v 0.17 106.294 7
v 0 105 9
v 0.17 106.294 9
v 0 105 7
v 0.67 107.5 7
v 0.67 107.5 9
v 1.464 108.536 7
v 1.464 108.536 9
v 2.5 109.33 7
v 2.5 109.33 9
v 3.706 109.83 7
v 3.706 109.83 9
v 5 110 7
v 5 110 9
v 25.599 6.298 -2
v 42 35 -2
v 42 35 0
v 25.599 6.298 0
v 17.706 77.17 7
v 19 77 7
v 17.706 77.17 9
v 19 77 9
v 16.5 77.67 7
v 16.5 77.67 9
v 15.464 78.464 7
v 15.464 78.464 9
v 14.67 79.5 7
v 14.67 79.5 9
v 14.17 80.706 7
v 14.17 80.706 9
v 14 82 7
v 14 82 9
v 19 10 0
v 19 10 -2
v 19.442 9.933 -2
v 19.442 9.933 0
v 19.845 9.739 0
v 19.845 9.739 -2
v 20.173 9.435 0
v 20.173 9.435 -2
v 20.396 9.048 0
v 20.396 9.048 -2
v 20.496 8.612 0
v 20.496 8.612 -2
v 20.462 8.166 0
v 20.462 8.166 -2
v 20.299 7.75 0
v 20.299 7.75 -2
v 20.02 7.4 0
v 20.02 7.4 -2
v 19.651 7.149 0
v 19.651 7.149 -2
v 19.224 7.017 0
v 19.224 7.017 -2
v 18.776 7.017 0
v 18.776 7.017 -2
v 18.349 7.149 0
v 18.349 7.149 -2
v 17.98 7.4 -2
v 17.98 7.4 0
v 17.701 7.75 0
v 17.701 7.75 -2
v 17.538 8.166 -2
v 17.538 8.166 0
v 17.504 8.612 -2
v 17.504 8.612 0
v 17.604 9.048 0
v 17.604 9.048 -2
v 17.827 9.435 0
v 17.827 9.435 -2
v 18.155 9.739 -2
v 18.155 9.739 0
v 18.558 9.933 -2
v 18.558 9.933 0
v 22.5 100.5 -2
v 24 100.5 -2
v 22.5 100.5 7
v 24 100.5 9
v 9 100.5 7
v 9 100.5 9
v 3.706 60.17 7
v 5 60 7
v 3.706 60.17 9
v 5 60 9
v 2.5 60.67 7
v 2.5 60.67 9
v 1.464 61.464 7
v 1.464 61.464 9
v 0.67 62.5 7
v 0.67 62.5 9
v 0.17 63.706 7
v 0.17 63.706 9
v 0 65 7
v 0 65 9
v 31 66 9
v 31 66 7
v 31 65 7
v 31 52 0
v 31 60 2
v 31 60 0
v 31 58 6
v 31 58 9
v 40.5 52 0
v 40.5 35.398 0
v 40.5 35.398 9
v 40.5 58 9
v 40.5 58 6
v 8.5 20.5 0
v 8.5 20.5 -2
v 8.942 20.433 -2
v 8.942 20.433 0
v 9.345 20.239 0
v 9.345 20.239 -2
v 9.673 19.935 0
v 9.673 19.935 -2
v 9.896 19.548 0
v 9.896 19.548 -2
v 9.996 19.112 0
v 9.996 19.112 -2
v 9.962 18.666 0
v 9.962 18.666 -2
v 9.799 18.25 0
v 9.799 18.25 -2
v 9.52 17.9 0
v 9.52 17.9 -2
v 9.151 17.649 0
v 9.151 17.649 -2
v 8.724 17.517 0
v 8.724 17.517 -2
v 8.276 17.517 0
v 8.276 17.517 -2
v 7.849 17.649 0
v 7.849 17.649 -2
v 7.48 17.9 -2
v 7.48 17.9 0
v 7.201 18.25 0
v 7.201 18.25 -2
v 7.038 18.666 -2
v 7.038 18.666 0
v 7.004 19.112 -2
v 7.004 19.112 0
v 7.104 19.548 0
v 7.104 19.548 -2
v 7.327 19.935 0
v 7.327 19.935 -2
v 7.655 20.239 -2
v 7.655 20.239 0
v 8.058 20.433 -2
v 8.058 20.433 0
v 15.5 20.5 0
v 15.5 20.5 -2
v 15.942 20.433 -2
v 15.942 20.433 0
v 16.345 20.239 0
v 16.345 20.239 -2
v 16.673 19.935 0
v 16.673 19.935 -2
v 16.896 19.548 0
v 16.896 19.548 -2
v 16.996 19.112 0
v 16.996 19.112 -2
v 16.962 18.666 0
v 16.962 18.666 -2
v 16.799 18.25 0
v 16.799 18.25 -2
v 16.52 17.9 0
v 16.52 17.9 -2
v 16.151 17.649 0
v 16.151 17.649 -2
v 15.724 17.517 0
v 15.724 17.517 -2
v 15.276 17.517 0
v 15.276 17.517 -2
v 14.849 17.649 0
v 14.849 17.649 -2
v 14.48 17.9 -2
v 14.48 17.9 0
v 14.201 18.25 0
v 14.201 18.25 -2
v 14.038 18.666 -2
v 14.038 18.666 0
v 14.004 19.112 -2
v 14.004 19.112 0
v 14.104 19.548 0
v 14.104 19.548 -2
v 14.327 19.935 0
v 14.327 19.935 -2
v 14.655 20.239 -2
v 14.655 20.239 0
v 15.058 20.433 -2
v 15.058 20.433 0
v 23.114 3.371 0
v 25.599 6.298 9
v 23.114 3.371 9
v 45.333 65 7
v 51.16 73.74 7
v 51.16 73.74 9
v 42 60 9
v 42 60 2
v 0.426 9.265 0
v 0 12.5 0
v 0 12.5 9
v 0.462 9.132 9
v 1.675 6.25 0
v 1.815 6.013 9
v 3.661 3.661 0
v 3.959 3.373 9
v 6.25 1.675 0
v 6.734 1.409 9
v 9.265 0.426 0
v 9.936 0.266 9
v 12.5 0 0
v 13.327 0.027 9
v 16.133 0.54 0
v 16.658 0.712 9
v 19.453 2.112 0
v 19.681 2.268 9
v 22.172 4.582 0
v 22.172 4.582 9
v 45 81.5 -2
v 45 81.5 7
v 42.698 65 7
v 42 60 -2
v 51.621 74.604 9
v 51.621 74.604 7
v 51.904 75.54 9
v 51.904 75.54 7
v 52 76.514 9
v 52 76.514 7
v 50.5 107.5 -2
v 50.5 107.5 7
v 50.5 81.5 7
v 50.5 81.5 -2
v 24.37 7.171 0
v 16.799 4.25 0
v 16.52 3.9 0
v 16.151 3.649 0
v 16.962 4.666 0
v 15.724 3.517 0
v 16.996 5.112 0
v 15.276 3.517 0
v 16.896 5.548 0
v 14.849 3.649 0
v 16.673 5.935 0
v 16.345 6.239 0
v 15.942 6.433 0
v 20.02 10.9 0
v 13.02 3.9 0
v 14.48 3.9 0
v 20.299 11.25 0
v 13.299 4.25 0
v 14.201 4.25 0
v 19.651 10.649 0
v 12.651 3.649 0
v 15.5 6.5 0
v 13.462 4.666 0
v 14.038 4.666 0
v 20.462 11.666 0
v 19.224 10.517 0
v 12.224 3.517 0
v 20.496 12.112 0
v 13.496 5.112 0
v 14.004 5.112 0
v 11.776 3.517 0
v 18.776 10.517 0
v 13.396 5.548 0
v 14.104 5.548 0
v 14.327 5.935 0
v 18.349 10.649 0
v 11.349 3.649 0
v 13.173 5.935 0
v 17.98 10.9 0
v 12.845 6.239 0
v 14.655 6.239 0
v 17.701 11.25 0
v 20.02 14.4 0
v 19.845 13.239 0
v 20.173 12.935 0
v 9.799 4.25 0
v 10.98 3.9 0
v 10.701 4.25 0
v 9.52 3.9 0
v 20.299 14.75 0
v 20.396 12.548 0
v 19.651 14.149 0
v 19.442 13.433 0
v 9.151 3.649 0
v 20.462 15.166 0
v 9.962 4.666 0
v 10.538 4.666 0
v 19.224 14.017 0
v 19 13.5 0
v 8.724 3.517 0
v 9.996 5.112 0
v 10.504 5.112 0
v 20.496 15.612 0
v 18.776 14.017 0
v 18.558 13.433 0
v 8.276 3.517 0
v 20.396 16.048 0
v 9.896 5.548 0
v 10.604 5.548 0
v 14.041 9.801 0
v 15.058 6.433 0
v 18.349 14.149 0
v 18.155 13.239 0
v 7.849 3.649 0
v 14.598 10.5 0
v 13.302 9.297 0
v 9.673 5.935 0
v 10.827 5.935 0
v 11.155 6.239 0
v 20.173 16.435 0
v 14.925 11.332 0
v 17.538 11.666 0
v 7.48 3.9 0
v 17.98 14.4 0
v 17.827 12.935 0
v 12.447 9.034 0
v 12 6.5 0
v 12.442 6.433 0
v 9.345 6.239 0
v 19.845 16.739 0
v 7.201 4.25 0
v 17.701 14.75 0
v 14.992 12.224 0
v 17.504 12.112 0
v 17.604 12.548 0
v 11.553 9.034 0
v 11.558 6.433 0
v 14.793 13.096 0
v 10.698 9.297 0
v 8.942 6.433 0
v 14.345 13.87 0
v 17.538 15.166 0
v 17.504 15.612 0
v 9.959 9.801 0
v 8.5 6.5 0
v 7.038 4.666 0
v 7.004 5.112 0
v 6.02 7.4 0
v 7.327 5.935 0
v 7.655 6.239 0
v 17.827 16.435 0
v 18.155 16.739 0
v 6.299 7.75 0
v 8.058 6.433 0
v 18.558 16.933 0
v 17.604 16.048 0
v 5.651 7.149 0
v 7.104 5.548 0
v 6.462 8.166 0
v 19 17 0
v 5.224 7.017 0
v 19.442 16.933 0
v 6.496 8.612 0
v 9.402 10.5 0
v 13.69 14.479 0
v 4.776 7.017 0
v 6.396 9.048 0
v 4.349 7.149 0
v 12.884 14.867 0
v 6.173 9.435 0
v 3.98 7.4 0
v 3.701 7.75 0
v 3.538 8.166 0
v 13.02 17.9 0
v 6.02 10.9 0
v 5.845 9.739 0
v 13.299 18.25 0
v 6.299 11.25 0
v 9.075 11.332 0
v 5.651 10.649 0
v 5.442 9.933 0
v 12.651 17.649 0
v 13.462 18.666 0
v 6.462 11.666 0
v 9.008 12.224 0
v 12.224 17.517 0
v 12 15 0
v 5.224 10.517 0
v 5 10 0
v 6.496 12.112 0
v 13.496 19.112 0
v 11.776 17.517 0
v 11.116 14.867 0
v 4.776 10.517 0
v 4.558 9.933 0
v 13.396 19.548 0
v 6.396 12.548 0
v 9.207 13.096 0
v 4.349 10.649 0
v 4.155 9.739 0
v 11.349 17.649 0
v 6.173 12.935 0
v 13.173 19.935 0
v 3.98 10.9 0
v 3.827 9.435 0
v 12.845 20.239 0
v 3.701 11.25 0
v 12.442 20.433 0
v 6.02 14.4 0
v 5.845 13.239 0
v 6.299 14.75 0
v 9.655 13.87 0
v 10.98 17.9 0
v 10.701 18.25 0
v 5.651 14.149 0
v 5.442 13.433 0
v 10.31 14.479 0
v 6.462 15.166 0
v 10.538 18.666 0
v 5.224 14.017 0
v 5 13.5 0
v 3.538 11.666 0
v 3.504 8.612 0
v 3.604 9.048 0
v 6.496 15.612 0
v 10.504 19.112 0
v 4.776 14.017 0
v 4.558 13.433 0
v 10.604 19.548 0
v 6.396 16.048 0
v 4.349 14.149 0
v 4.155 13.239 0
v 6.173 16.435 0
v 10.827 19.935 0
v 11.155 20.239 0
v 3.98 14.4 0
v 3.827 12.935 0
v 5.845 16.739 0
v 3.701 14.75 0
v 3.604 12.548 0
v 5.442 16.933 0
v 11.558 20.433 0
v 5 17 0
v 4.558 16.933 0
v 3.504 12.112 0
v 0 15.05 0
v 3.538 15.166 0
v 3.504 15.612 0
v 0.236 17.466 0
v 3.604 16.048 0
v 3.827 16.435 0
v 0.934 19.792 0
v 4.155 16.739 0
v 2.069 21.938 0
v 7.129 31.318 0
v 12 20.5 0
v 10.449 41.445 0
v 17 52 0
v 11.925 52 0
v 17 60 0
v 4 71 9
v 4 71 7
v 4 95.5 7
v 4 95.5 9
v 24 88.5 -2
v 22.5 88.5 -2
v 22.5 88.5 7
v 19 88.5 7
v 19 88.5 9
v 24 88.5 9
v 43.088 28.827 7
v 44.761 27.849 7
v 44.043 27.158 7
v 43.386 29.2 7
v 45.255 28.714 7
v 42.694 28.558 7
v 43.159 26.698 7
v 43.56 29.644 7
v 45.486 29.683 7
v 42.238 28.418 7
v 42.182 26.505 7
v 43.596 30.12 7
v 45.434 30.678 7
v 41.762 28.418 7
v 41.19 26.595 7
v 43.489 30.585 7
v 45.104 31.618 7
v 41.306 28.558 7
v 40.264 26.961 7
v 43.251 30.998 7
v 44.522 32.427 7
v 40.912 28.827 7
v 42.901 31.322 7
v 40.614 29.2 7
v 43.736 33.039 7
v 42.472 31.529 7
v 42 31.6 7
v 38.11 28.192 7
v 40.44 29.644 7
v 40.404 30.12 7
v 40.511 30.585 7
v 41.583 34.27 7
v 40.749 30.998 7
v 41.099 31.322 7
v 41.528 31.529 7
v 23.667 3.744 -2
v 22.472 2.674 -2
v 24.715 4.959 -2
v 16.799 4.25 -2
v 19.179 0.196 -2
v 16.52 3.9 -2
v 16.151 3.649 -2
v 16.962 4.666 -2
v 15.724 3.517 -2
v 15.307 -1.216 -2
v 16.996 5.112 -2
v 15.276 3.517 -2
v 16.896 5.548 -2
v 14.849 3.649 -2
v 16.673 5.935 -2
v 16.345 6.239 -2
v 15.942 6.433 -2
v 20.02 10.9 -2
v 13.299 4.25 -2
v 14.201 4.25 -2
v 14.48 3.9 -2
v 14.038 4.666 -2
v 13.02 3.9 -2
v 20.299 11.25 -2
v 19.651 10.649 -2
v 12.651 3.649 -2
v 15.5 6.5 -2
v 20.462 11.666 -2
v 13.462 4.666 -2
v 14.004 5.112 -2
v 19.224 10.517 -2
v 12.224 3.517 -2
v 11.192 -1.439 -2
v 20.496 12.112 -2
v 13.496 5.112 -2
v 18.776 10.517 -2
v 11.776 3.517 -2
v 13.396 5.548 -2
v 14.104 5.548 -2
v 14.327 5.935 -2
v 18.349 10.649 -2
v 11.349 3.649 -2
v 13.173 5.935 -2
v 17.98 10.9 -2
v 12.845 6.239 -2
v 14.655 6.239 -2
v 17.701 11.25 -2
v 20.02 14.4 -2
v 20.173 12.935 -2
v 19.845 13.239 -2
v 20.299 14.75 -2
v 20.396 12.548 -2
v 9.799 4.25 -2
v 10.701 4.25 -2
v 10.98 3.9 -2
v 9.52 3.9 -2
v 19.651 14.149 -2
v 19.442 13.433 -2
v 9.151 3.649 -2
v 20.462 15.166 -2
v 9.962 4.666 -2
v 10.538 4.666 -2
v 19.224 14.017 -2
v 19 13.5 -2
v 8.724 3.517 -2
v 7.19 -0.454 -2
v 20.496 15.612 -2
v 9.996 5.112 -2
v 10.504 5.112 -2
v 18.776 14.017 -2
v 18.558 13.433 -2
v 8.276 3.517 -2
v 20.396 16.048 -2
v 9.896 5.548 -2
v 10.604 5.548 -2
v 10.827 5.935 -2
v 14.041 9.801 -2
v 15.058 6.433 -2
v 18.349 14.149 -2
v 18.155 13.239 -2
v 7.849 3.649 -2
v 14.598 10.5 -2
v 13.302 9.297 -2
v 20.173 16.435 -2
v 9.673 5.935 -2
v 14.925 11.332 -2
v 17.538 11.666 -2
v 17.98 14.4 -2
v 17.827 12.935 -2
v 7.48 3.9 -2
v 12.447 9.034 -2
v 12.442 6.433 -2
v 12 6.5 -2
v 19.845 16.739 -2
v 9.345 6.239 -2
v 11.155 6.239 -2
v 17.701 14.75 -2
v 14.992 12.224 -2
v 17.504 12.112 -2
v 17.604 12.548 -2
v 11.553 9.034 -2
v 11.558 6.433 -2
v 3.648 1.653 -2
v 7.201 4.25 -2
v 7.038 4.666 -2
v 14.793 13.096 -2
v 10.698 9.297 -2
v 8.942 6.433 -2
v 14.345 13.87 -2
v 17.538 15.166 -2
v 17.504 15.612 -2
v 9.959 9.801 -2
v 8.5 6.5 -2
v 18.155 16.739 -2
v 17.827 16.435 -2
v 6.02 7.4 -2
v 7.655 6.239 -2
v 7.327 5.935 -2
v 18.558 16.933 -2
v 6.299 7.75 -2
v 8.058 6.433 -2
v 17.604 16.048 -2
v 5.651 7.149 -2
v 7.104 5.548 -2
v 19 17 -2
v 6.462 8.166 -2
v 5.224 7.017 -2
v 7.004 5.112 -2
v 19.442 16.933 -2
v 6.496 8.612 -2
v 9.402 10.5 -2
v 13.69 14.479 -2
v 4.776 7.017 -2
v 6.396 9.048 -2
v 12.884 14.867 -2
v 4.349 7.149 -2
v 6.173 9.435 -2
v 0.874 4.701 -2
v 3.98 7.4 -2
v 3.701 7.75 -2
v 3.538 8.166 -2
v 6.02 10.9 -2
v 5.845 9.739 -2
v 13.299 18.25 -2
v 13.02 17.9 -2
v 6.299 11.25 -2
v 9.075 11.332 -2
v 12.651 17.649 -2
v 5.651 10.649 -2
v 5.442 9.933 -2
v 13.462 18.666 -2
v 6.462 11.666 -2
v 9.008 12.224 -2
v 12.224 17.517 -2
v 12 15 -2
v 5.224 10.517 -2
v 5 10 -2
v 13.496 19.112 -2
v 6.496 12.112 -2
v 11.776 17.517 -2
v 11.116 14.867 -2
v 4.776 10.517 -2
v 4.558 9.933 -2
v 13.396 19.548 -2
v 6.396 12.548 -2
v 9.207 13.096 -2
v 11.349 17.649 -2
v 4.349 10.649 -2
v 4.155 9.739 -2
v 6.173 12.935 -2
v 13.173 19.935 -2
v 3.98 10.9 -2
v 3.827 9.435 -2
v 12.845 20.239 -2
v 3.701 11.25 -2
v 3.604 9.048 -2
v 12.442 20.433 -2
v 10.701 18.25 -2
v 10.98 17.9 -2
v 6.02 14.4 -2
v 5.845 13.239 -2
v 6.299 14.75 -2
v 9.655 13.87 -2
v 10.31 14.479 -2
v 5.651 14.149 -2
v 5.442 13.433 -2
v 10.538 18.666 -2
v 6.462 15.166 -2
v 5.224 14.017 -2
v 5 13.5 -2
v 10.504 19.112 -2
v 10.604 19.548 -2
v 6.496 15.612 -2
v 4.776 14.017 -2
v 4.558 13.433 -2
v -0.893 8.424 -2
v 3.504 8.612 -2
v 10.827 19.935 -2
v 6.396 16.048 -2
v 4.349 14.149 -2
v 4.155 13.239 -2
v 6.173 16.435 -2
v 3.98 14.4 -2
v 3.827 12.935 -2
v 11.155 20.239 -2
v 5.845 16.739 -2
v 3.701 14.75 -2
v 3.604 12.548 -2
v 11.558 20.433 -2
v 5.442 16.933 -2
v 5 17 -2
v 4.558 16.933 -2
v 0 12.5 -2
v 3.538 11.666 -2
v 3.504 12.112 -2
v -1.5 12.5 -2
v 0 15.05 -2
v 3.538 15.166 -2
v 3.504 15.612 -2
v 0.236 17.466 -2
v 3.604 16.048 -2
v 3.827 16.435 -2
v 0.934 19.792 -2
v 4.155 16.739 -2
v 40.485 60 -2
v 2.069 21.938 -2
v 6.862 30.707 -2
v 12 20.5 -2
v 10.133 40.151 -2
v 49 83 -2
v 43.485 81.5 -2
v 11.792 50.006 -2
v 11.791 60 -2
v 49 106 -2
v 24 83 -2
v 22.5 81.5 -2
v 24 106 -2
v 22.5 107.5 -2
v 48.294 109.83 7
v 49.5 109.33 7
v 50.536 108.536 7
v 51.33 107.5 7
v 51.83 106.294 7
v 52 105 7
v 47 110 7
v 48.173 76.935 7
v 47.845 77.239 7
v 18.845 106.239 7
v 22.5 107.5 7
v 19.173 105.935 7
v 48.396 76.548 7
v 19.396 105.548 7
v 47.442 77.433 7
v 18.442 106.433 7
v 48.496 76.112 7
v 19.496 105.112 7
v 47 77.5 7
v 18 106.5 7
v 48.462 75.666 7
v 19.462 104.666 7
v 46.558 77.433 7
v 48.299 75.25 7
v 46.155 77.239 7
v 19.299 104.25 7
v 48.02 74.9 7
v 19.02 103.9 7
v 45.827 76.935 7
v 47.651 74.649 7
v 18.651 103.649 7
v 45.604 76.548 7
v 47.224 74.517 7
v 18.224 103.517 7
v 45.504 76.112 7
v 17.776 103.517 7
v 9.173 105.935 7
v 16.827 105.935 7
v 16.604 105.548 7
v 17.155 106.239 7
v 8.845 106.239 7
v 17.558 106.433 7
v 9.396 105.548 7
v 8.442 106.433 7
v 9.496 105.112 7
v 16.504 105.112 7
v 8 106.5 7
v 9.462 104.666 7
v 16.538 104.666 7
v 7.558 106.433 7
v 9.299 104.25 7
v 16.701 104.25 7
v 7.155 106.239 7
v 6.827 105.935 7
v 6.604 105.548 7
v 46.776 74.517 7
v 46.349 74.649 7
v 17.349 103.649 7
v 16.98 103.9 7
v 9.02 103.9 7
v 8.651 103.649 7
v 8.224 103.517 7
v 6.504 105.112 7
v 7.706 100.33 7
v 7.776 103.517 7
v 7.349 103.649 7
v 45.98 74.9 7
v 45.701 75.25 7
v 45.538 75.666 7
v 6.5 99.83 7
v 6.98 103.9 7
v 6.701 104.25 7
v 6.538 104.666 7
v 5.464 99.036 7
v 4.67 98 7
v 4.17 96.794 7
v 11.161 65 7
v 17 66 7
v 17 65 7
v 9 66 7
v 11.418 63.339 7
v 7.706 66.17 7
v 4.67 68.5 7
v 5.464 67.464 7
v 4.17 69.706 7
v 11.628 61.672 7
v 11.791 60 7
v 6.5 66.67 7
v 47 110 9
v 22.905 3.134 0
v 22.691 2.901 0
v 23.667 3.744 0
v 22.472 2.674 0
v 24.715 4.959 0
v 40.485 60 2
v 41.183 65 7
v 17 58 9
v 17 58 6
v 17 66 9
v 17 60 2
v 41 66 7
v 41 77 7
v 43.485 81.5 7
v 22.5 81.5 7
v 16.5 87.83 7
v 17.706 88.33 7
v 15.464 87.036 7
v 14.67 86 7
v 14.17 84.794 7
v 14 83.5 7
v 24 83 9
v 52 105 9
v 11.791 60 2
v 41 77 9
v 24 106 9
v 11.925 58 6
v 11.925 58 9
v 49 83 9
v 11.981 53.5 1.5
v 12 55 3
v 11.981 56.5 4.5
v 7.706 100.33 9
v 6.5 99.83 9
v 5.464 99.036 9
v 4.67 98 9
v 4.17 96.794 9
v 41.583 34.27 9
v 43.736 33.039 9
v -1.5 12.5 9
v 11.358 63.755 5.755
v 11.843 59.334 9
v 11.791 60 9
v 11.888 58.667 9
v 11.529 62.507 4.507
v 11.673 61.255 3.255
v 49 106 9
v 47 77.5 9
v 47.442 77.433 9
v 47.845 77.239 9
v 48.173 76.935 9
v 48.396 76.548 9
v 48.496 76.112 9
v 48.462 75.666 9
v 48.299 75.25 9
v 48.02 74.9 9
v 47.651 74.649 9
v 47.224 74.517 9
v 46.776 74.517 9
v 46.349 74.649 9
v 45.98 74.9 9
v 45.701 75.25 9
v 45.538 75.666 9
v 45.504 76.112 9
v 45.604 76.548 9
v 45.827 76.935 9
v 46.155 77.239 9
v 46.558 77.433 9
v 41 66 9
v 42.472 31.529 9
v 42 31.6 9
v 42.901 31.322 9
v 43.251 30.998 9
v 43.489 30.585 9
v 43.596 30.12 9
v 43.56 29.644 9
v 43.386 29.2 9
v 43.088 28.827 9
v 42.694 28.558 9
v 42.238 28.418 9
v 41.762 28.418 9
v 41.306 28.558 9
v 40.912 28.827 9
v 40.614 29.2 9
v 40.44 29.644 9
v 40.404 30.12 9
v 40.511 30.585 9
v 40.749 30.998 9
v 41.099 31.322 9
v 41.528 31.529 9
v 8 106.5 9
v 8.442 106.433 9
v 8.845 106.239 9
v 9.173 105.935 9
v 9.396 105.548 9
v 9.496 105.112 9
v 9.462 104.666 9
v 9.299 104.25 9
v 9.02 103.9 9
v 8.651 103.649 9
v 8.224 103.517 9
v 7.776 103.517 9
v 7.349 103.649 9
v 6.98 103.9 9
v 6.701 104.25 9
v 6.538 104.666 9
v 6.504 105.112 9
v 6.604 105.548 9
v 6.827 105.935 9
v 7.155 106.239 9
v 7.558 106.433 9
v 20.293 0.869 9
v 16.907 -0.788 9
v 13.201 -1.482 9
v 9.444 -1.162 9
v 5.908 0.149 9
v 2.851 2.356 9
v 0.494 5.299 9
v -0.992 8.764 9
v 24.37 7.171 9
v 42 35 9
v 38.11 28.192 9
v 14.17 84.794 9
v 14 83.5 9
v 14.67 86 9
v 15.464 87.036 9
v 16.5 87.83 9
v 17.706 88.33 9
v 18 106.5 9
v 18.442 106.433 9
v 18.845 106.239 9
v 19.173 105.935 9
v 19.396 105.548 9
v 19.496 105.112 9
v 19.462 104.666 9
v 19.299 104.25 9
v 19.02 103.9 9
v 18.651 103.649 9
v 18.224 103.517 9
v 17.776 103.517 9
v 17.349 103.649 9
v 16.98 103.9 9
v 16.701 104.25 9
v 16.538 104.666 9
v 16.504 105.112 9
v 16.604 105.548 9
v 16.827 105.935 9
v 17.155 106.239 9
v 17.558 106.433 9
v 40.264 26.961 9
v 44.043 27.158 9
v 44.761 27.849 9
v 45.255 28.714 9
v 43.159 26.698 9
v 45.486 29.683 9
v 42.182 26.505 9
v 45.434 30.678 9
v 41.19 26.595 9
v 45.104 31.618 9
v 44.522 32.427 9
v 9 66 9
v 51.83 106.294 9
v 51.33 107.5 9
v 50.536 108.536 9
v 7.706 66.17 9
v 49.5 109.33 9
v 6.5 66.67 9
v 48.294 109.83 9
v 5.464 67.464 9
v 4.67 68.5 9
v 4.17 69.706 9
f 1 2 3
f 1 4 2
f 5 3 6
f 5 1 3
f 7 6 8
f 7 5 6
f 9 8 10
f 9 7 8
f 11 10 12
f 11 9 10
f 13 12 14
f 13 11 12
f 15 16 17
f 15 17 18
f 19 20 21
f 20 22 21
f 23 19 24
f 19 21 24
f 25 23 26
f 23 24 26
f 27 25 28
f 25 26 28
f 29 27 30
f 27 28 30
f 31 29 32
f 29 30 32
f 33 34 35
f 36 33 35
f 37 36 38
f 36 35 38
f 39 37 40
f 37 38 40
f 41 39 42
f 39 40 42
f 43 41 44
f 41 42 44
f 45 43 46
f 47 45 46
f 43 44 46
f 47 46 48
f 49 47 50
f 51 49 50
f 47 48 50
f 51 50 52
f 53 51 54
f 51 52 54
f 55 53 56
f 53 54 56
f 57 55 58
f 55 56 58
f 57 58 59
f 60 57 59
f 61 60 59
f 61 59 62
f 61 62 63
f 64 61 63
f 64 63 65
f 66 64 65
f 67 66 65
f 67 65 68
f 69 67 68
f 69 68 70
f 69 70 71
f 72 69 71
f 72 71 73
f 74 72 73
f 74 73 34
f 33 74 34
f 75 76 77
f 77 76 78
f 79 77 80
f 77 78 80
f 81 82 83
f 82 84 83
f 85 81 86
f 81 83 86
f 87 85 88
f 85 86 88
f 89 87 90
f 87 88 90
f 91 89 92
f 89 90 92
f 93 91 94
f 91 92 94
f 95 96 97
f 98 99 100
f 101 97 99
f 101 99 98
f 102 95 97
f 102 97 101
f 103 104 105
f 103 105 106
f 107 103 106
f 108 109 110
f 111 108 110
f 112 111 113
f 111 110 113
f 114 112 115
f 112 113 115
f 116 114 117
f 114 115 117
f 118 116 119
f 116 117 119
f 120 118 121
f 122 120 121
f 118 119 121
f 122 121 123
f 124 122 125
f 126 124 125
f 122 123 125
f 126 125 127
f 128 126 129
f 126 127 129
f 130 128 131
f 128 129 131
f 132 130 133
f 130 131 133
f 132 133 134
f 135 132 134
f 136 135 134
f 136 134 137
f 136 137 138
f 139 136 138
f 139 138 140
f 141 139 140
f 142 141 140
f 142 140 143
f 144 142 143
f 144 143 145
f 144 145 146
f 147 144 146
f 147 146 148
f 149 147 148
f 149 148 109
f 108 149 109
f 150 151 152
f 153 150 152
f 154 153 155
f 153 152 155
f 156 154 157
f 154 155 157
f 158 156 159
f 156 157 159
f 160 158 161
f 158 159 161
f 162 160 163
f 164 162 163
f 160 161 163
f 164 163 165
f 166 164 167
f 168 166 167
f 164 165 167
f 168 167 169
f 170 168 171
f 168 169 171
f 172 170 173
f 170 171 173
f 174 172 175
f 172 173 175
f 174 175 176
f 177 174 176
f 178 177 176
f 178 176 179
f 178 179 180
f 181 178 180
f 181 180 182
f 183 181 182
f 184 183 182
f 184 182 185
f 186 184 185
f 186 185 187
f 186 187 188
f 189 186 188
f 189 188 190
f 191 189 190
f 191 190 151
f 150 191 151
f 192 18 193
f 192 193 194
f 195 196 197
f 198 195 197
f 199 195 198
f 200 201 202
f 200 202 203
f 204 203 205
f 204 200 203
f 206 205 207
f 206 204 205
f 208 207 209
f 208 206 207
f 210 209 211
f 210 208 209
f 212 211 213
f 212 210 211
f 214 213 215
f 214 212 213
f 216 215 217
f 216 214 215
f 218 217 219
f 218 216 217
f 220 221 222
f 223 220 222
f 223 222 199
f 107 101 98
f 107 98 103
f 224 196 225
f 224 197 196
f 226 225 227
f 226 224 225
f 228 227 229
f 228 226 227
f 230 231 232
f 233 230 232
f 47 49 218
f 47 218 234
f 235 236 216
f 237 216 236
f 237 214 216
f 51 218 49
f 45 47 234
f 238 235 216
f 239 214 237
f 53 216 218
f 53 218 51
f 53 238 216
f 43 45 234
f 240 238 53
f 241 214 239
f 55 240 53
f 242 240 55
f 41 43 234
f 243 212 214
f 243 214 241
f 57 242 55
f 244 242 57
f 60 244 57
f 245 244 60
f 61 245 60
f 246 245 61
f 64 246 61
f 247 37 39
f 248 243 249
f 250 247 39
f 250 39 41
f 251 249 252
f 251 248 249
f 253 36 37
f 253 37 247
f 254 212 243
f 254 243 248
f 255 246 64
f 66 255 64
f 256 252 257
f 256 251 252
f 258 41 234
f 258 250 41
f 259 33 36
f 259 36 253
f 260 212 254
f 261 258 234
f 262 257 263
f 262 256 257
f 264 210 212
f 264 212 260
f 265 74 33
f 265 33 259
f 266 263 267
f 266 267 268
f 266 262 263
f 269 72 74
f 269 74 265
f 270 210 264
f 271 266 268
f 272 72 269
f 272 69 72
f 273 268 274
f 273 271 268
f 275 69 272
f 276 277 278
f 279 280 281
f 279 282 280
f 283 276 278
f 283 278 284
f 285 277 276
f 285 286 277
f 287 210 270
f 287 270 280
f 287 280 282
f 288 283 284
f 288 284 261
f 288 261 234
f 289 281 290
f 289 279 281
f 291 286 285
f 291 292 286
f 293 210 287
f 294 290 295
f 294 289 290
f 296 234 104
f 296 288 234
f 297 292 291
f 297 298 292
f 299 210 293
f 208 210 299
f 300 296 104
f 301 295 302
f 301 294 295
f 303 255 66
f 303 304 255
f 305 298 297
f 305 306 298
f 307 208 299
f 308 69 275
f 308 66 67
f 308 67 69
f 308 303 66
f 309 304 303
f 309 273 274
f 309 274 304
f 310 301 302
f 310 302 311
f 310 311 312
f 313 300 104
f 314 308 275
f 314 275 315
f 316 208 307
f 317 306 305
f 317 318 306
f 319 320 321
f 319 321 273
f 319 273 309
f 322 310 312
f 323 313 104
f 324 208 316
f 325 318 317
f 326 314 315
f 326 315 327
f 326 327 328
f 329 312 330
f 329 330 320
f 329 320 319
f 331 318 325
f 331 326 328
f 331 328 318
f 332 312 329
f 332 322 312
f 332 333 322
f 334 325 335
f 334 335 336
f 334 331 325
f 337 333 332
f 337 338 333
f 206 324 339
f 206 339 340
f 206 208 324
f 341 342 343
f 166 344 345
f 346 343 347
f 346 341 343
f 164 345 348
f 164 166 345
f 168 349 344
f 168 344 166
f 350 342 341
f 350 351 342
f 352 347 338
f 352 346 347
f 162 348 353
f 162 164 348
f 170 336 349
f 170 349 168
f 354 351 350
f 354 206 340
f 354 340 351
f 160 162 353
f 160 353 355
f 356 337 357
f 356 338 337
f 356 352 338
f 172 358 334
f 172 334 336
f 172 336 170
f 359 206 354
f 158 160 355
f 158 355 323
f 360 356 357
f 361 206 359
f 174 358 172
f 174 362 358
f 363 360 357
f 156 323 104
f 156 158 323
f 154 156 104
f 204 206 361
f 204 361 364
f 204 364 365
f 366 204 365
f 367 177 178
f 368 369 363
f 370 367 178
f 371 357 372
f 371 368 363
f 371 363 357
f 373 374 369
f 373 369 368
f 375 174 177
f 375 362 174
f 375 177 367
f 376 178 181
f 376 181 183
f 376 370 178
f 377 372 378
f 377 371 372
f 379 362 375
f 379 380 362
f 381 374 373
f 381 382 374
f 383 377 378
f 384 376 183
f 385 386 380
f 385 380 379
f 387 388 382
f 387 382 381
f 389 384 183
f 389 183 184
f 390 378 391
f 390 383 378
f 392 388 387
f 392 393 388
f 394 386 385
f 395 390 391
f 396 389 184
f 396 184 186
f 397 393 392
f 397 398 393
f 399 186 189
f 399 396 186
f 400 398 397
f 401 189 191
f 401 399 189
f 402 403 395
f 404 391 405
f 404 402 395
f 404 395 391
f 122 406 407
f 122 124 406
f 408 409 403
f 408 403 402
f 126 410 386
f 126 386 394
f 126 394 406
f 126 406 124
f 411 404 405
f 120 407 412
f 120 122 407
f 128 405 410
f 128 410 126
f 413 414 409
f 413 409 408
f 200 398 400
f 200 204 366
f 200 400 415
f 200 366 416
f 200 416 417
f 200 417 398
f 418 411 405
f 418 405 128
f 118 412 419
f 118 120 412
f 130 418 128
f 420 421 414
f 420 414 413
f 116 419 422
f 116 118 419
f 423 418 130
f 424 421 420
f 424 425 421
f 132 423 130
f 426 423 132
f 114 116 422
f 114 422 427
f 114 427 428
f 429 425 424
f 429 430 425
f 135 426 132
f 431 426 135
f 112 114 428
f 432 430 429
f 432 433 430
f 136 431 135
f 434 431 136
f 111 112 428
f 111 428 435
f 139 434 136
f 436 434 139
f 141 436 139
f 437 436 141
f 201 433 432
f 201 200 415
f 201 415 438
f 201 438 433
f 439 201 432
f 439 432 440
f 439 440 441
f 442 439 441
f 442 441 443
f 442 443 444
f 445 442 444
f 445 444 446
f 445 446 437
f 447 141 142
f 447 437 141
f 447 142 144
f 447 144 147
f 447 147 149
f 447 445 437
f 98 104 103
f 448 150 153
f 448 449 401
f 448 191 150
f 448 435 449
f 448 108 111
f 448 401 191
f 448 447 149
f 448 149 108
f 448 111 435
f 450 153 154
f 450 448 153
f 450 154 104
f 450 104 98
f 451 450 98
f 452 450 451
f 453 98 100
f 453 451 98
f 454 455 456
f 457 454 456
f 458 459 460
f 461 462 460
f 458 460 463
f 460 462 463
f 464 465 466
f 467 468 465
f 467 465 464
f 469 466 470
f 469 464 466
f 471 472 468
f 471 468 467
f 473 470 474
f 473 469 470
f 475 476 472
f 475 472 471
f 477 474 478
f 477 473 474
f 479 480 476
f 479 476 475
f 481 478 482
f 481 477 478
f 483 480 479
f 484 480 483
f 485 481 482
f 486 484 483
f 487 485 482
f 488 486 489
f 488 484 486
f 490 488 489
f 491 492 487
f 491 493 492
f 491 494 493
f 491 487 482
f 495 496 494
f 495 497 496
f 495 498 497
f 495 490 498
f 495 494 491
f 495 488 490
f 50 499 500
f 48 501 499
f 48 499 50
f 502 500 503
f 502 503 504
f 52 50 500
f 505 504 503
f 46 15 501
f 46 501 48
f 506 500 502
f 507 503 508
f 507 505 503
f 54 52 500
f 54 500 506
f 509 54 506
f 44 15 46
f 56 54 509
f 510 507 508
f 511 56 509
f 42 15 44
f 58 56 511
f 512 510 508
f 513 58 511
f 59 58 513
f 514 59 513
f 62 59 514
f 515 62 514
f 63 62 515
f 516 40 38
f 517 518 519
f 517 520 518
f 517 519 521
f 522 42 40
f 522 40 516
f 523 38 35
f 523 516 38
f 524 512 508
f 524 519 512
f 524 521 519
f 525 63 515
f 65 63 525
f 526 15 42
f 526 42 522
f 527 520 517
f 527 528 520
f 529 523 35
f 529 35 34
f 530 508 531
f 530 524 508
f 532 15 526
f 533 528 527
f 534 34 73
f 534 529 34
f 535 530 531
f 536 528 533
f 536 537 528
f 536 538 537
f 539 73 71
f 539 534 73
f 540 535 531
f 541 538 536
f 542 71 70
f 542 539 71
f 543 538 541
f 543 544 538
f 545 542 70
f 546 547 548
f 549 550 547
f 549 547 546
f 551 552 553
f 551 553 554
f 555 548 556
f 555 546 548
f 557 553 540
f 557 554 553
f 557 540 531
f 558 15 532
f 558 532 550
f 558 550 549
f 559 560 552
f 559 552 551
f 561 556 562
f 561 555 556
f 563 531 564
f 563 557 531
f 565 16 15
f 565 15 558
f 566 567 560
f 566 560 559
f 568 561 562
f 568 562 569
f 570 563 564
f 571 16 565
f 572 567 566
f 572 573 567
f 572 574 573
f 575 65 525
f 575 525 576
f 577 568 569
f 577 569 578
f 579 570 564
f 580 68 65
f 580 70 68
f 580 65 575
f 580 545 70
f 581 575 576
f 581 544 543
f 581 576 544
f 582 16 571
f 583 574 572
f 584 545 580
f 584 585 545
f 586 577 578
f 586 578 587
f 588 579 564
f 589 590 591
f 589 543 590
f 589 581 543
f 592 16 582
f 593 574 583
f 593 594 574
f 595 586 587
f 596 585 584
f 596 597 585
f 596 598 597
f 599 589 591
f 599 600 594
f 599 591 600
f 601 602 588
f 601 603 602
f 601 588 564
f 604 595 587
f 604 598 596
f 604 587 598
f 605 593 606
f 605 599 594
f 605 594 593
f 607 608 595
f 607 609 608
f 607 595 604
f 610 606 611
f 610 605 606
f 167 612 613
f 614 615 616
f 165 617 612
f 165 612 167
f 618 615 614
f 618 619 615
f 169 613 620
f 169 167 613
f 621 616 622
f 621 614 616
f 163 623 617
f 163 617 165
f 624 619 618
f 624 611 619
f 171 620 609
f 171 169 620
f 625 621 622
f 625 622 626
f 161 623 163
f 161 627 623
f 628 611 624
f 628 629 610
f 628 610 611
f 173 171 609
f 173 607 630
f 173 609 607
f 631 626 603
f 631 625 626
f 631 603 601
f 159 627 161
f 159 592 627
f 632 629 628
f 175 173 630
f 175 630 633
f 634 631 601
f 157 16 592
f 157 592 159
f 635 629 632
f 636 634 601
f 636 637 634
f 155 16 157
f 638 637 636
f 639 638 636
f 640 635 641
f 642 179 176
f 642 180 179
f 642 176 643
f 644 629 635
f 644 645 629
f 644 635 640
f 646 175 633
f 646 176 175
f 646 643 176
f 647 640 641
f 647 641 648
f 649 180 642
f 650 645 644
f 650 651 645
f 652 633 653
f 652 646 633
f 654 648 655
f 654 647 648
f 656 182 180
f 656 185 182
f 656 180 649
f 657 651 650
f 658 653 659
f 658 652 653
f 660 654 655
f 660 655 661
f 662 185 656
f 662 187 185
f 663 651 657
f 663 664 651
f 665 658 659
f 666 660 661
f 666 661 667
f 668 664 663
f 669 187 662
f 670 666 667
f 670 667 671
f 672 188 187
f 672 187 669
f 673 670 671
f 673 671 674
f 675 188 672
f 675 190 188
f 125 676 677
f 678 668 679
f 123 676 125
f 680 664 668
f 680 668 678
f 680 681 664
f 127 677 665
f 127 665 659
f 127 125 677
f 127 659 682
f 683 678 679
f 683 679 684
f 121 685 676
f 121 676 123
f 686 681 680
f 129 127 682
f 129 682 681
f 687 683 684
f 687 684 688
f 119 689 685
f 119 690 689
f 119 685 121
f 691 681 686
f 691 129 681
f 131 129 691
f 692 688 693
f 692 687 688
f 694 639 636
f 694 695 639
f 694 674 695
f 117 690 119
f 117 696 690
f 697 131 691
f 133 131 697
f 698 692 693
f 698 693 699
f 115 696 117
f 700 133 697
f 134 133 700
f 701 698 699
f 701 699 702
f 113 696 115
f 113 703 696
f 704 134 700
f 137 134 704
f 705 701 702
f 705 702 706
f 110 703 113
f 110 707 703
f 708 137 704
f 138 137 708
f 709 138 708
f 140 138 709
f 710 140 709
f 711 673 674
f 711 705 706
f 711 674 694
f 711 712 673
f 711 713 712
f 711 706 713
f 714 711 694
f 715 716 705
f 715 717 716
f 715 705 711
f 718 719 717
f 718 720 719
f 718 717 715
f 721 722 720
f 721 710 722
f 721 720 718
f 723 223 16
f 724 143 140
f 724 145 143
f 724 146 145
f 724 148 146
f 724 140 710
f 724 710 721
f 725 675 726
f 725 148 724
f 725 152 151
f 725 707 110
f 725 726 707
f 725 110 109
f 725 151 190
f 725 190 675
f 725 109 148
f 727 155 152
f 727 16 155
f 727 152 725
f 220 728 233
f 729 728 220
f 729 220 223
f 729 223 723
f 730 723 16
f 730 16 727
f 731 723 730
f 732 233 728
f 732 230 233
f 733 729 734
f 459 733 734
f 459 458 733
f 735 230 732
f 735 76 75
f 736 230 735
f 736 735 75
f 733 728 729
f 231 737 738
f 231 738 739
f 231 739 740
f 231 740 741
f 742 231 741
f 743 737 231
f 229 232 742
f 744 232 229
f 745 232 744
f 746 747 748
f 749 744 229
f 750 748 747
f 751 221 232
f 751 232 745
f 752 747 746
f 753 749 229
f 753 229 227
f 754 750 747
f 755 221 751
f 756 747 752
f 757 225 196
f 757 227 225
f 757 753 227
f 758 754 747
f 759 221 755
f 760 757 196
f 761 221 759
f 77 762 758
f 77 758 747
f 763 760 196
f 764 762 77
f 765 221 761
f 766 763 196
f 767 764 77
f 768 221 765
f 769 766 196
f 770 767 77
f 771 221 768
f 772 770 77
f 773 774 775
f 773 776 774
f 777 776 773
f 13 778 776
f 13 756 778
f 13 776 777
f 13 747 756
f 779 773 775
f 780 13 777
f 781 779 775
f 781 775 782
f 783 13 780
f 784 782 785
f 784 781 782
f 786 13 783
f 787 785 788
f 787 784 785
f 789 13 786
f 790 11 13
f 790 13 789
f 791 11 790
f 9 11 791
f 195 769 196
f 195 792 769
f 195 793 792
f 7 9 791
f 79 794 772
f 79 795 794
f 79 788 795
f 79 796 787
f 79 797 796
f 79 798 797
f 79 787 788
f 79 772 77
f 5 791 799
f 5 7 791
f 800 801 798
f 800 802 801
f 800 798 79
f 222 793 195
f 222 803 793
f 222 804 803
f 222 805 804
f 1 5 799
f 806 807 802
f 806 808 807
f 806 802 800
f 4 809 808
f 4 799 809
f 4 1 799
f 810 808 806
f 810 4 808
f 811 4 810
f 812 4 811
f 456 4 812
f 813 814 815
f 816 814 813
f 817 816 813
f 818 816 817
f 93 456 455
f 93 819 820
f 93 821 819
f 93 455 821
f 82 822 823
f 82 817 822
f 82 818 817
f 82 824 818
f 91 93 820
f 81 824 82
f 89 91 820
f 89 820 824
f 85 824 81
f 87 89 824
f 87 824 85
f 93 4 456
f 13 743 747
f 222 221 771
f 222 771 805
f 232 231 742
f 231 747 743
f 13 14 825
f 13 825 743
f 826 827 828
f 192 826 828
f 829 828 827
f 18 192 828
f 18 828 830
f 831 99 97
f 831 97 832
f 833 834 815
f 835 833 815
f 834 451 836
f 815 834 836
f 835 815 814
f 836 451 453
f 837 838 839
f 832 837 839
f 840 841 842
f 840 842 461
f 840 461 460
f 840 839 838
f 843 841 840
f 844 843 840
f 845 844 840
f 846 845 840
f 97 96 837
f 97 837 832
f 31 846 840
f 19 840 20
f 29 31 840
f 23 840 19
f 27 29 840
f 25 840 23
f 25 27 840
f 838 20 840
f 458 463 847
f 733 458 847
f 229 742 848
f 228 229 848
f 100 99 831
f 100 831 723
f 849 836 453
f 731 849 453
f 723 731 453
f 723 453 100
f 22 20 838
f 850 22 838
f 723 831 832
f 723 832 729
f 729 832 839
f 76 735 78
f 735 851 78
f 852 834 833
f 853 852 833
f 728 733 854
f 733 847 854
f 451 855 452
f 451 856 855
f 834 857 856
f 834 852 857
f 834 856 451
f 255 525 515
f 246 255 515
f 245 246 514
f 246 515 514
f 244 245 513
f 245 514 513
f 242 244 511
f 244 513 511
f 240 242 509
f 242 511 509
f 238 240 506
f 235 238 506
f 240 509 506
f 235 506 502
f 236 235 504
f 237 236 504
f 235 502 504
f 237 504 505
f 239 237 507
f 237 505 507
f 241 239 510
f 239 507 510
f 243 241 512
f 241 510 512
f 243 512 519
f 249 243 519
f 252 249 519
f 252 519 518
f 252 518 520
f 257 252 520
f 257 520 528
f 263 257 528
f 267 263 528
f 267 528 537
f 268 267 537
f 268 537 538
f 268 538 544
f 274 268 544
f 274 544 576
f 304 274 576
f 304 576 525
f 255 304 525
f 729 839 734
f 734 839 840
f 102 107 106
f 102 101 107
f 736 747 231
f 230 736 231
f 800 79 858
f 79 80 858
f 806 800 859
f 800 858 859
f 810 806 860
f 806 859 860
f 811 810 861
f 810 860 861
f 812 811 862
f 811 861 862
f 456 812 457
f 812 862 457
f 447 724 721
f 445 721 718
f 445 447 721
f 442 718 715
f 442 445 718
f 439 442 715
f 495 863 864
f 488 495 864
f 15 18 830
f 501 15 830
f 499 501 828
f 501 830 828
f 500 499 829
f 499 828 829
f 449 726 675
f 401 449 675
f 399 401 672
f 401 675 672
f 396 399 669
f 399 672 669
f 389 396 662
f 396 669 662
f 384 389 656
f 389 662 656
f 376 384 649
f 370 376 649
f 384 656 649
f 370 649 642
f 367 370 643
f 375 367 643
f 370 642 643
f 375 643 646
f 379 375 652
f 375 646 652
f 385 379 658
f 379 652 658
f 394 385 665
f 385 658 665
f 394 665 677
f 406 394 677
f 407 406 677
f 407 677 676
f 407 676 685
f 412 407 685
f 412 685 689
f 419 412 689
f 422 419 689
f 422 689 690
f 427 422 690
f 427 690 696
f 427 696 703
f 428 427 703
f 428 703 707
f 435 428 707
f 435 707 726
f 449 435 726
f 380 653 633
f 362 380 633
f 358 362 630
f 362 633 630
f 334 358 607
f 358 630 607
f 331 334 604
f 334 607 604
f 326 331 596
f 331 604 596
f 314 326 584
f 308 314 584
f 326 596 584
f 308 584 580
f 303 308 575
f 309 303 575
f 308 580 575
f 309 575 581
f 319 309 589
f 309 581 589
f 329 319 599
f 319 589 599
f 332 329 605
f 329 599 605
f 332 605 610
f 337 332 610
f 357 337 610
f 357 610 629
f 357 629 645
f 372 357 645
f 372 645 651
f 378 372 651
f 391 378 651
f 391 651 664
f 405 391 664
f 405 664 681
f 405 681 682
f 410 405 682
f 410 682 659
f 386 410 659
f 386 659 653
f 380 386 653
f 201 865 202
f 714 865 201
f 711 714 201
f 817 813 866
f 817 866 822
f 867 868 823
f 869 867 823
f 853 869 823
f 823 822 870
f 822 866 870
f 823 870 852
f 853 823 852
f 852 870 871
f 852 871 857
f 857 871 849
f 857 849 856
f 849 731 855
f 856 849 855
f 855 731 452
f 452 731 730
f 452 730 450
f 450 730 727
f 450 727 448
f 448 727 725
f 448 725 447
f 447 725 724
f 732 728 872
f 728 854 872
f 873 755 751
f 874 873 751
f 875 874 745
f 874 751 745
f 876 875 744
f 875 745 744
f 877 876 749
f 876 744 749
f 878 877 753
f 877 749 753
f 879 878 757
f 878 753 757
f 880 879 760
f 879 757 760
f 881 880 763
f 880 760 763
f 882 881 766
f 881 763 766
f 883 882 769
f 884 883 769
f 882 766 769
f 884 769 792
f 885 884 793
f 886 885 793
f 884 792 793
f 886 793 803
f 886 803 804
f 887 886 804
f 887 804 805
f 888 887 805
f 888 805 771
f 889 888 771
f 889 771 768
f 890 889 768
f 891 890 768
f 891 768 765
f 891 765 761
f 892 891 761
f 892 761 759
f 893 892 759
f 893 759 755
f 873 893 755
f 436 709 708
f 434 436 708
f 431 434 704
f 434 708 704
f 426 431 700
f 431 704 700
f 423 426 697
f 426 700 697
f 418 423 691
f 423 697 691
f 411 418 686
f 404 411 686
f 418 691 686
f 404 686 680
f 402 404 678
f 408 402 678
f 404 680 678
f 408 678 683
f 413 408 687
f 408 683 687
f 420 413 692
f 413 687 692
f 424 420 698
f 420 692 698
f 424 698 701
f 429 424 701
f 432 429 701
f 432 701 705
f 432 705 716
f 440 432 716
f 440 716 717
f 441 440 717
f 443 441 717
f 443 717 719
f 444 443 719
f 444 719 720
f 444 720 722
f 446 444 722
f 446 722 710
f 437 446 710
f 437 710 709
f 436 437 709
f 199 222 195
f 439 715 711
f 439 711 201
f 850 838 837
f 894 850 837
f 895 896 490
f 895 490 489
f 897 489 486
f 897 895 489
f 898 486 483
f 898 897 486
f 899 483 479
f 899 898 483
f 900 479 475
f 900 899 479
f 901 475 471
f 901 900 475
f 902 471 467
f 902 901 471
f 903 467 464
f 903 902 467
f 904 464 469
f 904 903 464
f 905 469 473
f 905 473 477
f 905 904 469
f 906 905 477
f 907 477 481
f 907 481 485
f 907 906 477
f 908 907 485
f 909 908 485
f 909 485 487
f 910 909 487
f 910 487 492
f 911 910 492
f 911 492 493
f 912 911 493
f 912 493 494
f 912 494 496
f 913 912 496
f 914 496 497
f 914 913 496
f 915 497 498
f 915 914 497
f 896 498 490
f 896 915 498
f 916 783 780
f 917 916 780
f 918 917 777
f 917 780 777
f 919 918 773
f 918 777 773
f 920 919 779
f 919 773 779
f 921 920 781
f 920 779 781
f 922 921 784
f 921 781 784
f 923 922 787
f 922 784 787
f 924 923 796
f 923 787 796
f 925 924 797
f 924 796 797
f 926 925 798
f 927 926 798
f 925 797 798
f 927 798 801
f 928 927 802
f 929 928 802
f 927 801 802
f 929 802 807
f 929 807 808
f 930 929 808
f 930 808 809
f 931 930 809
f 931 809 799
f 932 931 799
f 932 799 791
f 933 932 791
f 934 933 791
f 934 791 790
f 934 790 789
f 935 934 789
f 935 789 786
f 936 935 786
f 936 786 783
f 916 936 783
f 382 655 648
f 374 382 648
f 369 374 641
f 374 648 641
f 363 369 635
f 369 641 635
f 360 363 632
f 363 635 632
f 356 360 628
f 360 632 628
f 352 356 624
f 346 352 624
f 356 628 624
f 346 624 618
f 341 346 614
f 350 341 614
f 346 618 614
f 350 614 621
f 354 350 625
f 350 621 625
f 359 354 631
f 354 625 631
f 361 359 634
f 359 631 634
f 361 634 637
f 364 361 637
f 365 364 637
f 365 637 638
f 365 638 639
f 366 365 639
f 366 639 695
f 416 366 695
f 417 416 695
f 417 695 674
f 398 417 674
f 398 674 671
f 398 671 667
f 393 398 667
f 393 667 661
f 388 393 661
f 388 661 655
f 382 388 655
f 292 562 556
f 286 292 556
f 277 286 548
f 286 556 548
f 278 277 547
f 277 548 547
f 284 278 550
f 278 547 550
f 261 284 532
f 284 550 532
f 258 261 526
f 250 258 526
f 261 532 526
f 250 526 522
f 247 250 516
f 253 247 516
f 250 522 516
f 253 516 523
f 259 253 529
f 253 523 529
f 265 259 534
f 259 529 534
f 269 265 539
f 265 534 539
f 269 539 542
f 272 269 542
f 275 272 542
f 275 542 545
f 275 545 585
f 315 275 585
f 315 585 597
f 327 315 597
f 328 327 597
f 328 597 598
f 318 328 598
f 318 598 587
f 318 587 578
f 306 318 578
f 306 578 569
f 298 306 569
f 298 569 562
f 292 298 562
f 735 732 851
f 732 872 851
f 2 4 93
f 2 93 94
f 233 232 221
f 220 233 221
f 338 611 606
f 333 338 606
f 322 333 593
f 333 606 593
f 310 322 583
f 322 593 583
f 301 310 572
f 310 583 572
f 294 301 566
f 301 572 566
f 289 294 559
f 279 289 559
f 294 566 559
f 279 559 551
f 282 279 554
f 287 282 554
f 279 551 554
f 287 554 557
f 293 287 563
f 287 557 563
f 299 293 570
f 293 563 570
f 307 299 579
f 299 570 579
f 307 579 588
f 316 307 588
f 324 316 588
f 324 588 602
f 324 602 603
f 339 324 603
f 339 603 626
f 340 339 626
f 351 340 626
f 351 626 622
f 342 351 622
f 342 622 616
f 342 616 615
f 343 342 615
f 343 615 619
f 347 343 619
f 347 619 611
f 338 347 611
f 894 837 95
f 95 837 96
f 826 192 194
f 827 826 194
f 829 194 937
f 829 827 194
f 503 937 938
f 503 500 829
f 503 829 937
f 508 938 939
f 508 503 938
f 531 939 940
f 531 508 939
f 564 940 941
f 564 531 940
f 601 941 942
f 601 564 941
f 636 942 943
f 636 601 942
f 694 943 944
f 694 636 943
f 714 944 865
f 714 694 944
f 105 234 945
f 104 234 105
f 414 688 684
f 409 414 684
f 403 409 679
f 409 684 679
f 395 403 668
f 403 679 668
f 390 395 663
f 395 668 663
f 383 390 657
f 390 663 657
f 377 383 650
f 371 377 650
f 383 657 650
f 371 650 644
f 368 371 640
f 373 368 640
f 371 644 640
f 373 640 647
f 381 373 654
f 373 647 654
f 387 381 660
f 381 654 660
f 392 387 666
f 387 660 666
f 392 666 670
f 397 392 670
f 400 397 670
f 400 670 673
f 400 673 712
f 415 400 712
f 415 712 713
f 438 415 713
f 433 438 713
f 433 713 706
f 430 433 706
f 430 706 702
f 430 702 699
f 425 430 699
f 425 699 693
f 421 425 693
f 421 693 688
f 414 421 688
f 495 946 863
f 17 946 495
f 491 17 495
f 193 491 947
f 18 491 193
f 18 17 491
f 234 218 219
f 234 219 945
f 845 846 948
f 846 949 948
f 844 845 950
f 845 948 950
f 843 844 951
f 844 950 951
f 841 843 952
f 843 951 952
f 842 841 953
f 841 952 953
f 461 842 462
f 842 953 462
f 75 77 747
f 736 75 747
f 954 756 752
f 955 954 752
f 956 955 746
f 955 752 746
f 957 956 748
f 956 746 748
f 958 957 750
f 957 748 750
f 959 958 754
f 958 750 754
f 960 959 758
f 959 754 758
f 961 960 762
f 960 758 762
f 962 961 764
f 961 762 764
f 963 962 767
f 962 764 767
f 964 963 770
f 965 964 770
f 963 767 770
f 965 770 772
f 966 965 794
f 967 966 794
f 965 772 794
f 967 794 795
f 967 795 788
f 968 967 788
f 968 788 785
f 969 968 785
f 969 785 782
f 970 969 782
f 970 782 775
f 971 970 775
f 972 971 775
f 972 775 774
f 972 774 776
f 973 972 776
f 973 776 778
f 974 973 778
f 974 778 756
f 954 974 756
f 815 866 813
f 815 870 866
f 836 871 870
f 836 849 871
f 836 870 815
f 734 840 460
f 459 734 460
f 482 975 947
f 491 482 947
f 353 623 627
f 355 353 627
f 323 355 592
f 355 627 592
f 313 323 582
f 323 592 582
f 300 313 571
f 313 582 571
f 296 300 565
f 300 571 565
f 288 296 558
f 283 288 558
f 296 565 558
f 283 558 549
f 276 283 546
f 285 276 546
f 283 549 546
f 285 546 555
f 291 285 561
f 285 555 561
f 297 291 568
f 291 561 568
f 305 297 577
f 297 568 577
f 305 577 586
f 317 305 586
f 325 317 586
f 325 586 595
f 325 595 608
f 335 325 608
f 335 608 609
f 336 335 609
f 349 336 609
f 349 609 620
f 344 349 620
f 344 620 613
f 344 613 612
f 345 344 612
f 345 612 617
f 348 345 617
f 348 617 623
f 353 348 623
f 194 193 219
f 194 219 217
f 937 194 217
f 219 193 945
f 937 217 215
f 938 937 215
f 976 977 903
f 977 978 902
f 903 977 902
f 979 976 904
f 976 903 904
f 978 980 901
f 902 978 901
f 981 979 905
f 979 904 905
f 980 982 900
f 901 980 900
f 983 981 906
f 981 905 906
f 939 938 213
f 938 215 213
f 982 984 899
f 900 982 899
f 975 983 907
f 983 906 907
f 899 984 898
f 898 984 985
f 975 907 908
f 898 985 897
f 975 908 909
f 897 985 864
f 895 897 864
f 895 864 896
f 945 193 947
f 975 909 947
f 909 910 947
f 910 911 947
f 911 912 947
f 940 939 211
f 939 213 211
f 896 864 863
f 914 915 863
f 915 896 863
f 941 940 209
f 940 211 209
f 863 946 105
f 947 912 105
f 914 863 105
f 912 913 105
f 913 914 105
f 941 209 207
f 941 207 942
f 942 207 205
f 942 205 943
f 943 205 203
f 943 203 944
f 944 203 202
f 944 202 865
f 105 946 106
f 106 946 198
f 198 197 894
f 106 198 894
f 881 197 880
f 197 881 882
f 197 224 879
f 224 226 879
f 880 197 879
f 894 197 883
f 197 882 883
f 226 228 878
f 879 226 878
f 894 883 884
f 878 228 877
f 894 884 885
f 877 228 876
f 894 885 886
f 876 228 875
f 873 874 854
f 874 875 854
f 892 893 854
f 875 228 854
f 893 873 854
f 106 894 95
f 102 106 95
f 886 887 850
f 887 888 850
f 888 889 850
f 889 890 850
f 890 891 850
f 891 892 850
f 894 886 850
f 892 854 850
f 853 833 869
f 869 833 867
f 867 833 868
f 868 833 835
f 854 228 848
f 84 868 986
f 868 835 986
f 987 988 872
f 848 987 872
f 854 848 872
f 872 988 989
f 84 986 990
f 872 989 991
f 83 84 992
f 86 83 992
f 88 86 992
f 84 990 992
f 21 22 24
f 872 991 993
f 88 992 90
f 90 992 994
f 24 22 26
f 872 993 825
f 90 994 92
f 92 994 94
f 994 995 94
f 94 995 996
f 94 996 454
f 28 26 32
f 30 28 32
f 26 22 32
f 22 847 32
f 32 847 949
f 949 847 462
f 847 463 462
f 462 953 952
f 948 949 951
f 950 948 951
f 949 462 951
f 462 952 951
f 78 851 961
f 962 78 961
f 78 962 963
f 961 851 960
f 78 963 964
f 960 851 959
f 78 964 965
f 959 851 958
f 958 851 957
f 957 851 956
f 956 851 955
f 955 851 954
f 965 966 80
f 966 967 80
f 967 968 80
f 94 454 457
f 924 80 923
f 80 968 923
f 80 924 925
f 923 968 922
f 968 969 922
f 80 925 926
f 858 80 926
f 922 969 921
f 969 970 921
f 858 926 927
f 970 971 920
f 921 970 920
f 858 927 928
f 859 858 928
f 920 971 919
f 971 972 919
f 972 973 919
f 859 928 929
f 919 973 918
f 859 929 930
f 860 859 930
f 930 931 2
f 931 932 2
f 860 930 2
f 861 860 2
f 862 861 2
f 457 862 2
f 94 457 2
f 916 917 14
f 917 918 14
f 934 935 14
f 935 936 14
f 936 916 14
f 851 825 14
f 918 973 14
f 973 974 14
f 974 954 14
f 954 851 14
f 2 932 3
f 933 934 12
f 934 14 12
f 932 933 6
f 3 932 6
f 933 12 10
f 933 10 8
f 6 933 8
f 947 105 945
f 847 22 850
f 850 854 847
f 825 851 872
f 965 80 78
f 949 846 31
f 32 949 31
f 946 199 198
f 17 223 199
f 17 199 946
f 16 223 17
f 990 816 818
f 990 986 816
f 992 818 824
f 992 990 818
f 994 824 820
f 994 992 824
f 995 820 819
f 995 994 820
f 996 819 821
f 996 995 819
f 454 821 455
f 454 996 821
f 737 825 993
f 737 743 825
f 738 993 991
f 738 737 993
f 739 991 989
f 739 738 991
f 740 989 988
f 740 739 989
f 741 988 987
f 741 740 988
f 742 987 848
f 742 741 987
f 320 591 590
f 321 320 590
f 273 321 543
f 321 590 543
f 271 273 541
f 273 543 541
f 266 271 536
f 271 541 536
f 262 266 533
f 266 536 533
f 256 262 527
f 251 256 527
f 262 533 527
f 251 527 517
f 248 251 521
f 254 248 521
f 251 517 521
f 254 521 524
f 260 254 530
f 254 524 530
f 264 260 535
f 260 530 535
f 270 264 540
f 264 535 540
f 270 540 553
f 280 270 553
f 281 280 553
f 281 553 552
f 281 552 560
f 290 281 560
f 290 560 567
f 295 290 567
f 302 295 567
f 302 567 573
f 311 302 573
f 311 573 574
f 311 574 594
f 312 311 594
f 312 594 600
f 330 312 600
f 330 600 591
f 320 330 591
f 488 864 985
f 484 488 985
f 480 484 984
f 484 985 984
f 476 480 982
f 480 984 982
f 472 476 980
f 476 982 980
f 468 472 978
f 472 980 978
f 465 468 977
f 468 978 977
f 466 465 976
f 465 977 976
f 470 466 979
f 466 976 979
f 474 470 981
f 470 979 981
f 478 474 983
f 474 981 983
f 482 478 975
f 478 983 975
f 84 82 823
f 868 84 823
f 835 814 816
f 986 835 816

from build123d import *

# Parameters (mm, degrees)
EXTRUDE_1_DEPTH                 = 52
CUT_EXTRUDE_1_REACH             = 124.004
CUT_EXTRUDE_1_DIRECTION_2_DEPTH = 7
SKETCH_3_R                      = 1.5
SKETCH_3_R_2                    = 3
CUT_EXTRUDE_2_DEPTH             = 123.167917229
FILLET_1_R                      = 5
CHAMFER_1_SIZE                  = 5
FILLET_2_R                      = 12.5
EXTRUDE_2_DEPTH                 = 9
EXTRUDE_3_DEPTH                 = 9
EXTRUDE_3_DEPTH_BACK            = 2
CHAMFER_3_SIZE                  = 6
EXTRUDE_START                   = -11
SKETCH_7_R                      = 1.6
EXTRUDE_4_DEPTH                 = 2


with BuildPart() as part:
    # 草图1 → 凸台-拉伸1 (new body)
    with BuildSketch(Plane(origin=(0, 0, 0), x_dir=(0, 0, -1), z_dir=(1, 0, 0))):
        Polygon((0, 0), (0, 58), (-9, 58), (-9, 110), (-7, 110), (-7, 60), (2, 60), (2, 0), align=None)
    extrude(amount=EXTRUDE_1_DEPTH)

    # 草图2 → 切除-拉伸1 (cut, up to next)
    with BuildSketch(Plane(origin=(0, 0, 7), x_dir=(-1, 0, 0), z_dir=(0, 0, -1)), mode=Mode.PRIVATE) as cut_extrude_1_sk1:
        Polygon((-49, 106), (-49, 83), (-24, 83), (-24, 88.5), (-14, 88.5), (-14, 77), (-41, 77), (-41, 66), (-31, 66), (-31, 58), (-17, 58), (-17, 66), (-4, 66), (-4, 100.5), (-24, 100.5), (-24, 106), align=None)
    cut_extrude_1_tool1 = extrude(cut_extrude_1_sk1.sketch, amount=-CUT_EXTRUDE_1_REACH, mode=Mode.PRIVATE) & part.part
    add(cut_extrude_1_tool1.solids().sort_by_distance((25.692202, 84.595066, 7))[0], mode=Mode.SUBTRACT)

    # 草图2 → 切除-拉伸1 direction 2 (cut)
    with BuildSketch(Plane(origin=(0, 0, 7), x_dir=(-1, 0, 0), z_dir=(0, 0, -1))):
        Polygon((-49, 106), (-49, 83), (-24, 83), (-24, 88.5), (-14, 88.5), (-14, 77), (-41, 77), (-41, 66), (-31, 66), (-31, 58), (-17, 58), (-17, 66), (-4, 66), (-4, 100.5), (-24, 100.5), (-24, 106), align=None)
    extrude(amount=CUT_EXTRUDE_1_DIRECTION_2_DEPTH, mode=Mode.SUBTRACT)

    # 草图3 → 切除-拉伸2 (cut, through all)
    with BuildSketch(Plane(origin=(0, 0, -2), x_dir=(-1, 0, 0), z_dir=(0, 0, -1))):
        with Locations(Location((-15.5, 19, 0), (0, 0, 90))):
            Circle(SKETCH_3_R)
        with Locations(Location((-12, 19, 0), (0, 0, 90))):
            Circle(SKETCH_3_R)
        with Locations(Location((-8.5, 19, 0), (0, 0, 90))):
            Circle(SKETCH_3_R)
        with Locations(Location((-8.5, 5, 0), (0, 0, 90))):
            Circle(SKETCH_3_R)
        with Locations(Location((-12, 5, 0), (0, 0, 90))):
            Circle(SKETCH_3_R)
        with Locations(Location((-15.5, 5, 0), (0, 0, 90))):
            Circle(SKETCH_3_R)
        with Locations(Location((-5, 15.5, 0), (0, 0, 90))):
            Circle(SKETCH_3_R)
        with Locations(Location((-5, 12, 0), (0, 0, 90))):
            Circle(SKETCH_3_R)
        with Locations(Location((-5, 8.5, 0), (0, 0, 90))):
            Circle(SKETCH_3_R)
        with Locations(Location((-19, 8.5, 0), (0, 0, 90))):
            Circle(SKETCH_3_R)
        with Locations(Location((-19, 12, 0), (0, 0, 90))):
            Circle(SKETCH_3_R)
        with Locations(Location((-19, 15.5, 0), (0, 0, 90))):
            Circle(SKETCH_3_R)
        with Locations(Location((-8, 105, 0), (0, 0, 90))):
            Circle(SKETCH_3_R)
        with Locations(Location((-47, 76, 0), (0, 0, 90))):
            Circle(SKETCH_3_R)
        with Locations(Location((-18, 105, 0), (0, 0, 90))):
            Circle(SKETCH_3_R)
        with Locations(Location((-12, 12, 0), (0, 0, 90))):
            Circle(SKETCH_3_R_2)
        Polygon((-42, 35), (-22, 0), (-52, 0), (-52, 75), (-42, 60), align=None)
        with BuildLine():
            Line((0, 60), (-11.791303716, 60))
            ThreePointArc((-11.791303716, 60), (-9.662737441, 38.416613409), (0, 19))
            Line((0, 19), (0, 60))
        make_face()
    extrude(amount=-CUT_EXTRUDE_2_DEPTH, mode=Mode.SUBTRACT)

    # 圆角1
    fillet_1_edges = [part.edges().sort_by_distance(p)[0] for p in [
        (0, 60, 8),
        (52, 75, 8),
        (52, 110, 8),
        (14, 88.5, 8),
        (14, 77, 8),
        (4, 66, 8),
        (4, 100.5, 8),
        (0, 110, 8),
    ]]
    fillet(fillet_1_edges, radius=FILLET_1_R)

    # 倒角1
    chamfer_1_edges = [part.edges().sort_by_distance(p)[0] for p in [
        (36.5, 60, 7),
        (14.395651858, 60, 7),
    ]]
    chamfer(chamfer_1_edges, length=CHAMFER_1_SIZE)

    # 圆角2
    fillet_2_edges = [part.edges().sort_by_distance(p)[0] for p in [
        (0, 0, -1),
        (22, 0, -1),
        (0, 19, -1),
    ]]
    fillet(fillet_2_edges, radius=FILLET_2_R)

    # 草图4 → 凸台-拉伸2 (add)
    with BuildSketch(Plane(origin=(0, 0, 7), x_dir=(-1, 0, 0), z_dir=(0, 0, -1))):
        Polygon((-24, 88.5), (-24, 83), (-49, 83), (-49, 106), (-24, 106), (-24, 100.5), (-22.5, 100.5), (-22.5, 107.5), (-50.5, 107.5), (-50.5, 81.5), (-45, 81.5), (-42, 60), (-40.485467906, 60), (-43.485467906, 81.5), (-22.5, 81.5), (-22.5, 88.5), align=None)
    extrude(amount=EXTRUDE_2_DEPTH)

    # 草图6 → 凸台-拉伸3 (add, two sides: drawn at the far end of the back side and taken through both)
    with BuildSketch(Plane.XY.offset(-EXTRUDE_3_DEPTH_BACK)):
        with BuildLine():
            Line((42, 58), (42, 35))
            Line((42, 35), (25.599007583, 6.298263271))
            Line((25.599007583, 6.298263271), (23.114212107, 3.371007649))
            ThreePointArc((23.114212107, 3.371007649), (7.631682503, -0.626289832), (-1.5, 12.5))
            Line((-1.5, 12.5), (0, 12.5))
            ThreePointArc((0, 12.5), (8.295901466, 0.728188095), (22.172088883, 4.581622853))
            Line((22.172088883, 4.581622853), (24.370109829, 7.171038857))
            Line((24.370109829, 7.171038857), (40.5, 35.398346656))
            Line((40.5, 35.398346656), (40.5, 58))
            Line((40.5, 58), (42, 58))
        make_face()
    extrude(amount=EXTRUDE_3_DEPTH + EXTRUDE_3_DEPTH_BACK)

    # 倒角3
    chamfer_3_edges = [part.edges().sort_by_distance(p)[0] for p in [
        (14.462476533, 58, 0),
        (35.75, 58, 0),
    ]]
    chamfer(chamfer_3_edges, length=CHAMFER_3_SIZE)

    # 草图7 → 凸台-拉伸4 (add)
    with BuildSketch(Plane(origin=(0, 0, -2), x_dir=(-1, 0, 0), z_dir=(0, 0, -1)).offset(EXTRUDE_START)):
        with BuildLine():
            Line((-41.58264013, 34.269620228), (-43.736486284, 33.038850997))
            ThreePointArc((-43.736486284, 33.038850997), (-45.038850997, 28.263513716), (-40.263513716, 26.961149003))
            Line((-40.263513716, 26.961149003), (-38.109667562, 28.191918233))
            Line((-38.109667562, 28.191918233), (-41.58264013, 34.269620228))
        make_face()
        with Locations(Location((-42, 30, 0), (0, 0, 90))):
            Circle(SKETCH_7_R, mode=Mode.SUBTRACT)
    extrude(amount=EXTRUDE_4_DEPTH)


solid = part.part
